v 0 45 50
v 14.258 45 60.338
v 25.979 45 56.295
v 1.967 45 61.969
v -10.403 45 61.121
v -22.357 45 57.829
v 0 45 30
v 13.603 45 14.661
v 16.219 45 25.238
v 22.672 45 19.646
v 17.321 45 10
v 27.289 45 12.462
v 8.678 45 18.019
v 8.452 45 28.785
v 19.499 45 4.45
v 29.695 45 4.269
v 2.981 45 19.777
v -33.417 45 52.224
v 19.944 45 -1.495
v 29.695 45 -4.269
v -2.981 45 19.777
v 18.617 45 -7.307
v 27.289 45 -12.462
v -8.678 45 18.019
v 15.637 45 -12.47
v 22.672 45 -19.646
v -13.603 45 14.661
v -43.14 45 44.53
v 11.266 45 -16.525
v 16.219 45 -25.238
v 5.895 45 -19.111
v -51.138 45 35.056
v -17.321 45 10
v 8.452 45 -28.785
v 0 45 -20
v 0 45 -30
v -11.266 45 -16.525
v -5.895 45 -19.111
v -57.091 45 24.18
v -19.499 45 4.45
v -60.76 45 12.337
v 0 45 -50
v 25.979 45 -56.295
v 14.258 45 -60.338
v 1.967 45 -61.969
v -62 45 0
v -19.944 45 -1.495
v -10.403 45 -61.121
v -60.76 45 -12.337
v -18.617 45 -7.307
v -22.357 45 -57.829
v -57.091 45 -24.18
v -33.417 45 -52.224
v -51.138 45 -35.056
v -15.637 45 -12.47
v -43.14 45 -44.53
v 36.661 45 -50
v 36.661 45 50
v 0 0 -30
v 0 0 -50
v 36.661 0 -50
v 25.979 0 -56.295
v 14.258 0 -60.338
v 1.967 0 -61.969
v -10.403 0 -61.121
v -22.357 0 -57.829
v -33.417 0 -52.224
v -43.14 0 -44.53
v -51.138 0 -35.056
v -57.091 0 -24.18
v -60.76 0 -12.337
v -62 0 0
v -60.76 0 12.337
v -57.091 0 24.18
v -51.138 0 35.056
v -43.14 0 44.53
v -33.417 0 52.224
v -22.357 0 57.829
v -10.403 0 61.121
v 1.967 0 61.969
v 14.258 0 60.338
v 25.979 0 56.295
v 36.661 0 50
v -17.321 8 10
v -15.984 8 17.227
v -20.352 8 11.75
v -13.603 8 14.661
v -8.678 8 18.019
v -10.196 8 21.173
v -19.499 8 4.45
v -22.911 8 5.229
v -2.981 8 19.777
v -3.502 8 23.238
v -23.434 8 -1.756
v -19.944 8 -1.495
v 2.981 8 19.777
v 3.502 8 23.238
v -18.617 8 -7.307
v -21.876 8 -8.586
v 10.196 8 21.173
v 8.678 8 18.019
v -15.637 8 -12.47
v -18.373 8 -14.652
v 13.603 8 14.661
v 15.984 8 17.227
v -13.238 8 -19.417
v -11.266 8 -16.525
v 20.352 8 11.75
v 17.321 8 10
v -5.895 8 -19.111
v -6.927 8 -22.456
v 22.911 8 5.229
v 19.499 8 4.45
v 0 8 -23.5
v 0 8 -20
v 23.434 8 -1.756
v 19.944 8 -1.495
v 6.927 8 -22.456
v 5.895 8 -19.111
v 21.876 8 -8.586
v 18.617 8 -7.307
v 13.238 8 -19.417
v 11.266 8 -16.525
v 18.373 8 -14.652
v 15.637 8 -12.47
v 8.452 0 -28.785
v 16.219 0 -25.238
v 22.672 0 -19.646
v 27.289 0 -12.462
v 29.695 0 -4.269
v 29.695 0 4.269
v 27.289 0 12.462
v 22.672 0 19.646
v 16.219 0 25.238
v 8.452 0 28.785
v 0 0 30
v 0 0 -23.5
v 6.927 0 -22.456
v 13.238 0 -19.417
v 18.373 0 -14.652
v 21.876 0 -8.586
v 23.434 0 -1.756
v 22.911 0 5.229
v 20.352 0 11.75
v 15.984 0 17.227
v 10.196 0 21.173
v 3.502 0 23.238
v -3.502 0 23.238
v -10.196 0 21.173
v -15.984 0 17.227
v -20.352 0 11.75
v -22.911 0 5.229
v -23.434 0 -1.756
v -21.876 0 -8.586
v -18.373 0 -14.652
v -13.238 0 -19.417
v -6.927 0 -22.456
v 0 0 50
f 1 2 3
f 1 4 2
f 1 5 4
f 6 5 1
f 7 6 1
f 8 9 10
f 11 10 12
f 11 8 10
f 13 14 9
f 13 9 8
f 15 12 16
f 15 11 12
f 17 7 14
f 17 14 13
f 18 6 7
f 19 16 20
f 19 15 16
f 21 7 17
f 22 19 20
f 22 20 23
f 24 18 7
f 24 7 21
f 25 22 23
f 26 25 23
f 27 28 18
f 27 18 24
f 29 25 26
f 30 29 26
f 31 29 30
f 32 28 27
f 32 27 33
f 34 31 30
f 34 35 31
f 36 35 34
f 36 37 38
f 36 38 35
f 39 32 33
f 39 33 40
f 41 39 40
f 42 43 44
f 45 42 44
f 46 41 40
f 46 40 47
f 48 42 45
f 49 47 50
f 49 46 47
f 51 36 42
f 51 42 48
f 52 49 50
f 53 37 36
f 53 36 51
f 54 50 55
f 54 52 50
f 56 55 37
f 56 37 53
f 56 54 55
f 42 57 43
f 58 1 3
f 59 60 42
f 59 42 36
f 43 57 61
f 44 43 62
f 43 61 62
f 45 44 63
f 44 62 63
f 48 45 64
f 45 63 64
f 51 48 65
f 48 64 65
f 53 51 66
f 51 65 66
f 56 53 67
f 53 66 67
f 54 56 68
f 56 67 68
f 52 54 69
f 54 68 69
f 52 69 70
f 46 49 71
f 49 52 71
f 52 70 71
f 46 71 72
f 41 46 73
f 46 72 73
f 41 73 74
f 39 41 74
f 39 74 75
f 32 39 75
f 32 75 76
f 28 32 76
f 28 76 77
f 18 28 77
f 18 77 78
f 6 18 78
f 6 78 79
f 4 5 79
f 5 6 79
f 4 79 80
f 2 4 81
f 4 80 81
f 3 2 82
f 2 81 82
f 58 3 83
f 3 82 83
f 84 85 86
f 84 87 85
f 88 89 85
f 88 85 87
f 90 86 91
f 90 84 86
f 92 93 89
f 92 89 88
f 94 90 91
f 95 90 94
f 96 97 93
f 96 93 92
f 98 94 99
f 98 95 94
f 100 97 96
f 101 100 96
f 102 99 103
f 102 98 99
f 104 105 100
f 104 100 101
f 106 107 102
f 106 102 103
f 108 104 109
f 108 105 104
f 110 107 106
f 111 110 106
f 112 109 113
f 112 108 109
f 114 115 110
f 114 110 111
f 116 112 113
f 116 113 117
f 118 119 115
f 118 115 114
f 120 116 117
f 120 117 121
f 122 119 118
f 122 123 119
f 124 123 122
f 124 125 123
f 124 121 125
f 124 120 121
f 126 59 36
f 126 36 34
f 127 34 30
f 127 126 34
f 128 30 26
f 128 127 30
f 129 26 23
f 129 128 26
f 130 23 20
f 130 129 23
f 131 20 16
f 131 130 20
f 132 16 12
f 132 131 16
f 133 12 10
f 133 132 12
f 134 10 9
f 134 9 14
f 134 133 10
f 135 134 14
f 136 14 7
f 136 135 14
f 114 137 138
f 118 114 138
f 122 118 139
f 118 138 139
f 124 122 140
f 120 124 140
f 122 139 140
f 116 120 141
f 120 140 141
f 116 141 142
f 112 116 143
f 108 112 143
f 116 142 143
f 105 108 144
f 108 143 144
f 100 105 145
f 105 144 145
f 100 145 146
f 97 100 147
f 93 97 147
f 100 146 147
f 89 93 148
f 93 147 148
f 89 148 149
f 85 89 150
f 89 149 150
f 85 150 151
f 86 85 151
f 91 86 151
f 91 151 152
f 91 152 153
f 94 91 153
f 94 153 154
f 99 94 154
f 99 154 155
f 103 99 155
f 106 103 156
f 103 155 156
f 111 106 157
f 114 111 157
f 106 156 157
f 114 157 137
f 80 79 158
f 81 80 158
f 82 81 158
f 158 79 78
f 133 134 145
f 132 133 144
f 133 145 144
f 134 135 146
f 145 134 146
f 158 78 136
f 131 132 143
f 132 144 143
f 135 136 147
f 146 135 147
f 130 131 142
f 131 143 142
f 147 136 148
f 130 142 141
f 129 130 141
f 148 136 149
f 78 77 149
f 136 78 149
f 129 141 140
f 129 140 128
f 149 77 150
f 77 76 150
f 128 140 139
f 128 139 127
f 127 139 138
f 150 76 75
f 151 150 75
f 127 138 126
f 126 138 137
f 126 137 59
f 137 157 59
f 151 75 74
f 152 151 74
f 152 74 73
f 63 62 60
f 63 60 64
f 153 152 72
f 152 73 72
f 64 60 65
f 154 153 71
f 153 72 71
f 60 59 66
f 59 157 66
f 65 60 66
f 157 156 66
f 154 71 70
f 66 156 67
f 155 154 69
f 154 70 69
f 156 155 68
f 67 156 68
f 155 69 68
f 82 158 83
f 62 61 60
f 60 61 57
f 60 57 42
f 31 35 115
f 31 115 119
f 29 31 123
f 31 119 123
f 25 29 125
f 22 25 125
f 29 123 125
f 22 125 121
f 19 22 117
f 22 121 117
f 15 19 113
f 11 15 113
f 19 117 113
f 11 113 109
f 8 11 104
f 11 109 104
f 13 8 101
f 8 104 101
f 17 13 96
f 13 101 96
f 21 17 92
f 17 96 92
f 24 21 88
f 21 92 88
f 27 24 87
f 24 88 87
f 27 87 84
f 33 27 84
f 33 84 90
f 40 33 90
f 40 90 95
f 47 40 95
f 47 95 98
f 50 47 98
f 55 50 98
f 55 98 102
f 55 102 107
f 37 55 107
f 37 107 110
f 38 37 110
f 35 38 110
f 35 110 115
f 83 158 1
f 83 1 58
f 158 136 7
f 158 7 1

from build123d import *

# Parameters (mm, degrees)
CROQUIS1_R              = 62
SALIENTE_EXTRUIR1_DEPTH = 45
CROQUIS3_R              = 23.5
CORTAR_EXTRUIR1_DEPTH   = 8
CROQUIS4_R              = 20
CORTAR_EXTRUIR2_DEPTH   = 99.554553421
CORTAR_EXTRUIR3_DEPTH   = 99.554553421


with BuildPart() as part:
    # Croquis1 → Saliente-Extruir1 (new body)
    with BuildSketch(Plane(origin=(0, 0, 0), x_dir=(1, 0, 0), z_dir=(0, 1, 0))):
        Circle(CROQUIS1_R)
    extrude(amount=SALIENTE_EXTRUIR1_DEPTH)

    # Croquis3 → Cortar-Extruir1 (cut)
    with BuildSketch(Plane.XZ):
        Circle(CROQUIS3_R)
    extrude(amount=-CORTAR_EXTRUIR1_DEPTH, mode=Mode.SUBTRACT)

    # Croquis4 → Cortar-Extruir2 (cut, through all)
    with BuildSketch(Plane.XZ):
        Circle(CROQUIS4_R)
    extrude(amount=-CORTAR_EXTRUIR2_DEPTH, mode=Mode.SUBTRACT)

    # Croquis5 → Cortar-Extruir3 (cut, through all)
    with BuildSketch(Plane.XZ):
        with BuildLine():
            Line((0, 30), (0, 50))
            Line((0, 50), (36.66060556, 50))
            Line((36.66060556, 50), (110, 15))
            Line((110, 15), (110, -15))
            Line((110, -15), (36.66060556, -50))
            Line((36.66060556, -50), (0, -50))
            Line((0, -50), (0, -30))
            ThreePointArc((0, -30), (30, 0), (0, 30))
        make_face()
    extrude(amount=-CORTAR_EXTRUIR3_DEPTH, mode=Mode.SUBTRACT)


solid = part.part
